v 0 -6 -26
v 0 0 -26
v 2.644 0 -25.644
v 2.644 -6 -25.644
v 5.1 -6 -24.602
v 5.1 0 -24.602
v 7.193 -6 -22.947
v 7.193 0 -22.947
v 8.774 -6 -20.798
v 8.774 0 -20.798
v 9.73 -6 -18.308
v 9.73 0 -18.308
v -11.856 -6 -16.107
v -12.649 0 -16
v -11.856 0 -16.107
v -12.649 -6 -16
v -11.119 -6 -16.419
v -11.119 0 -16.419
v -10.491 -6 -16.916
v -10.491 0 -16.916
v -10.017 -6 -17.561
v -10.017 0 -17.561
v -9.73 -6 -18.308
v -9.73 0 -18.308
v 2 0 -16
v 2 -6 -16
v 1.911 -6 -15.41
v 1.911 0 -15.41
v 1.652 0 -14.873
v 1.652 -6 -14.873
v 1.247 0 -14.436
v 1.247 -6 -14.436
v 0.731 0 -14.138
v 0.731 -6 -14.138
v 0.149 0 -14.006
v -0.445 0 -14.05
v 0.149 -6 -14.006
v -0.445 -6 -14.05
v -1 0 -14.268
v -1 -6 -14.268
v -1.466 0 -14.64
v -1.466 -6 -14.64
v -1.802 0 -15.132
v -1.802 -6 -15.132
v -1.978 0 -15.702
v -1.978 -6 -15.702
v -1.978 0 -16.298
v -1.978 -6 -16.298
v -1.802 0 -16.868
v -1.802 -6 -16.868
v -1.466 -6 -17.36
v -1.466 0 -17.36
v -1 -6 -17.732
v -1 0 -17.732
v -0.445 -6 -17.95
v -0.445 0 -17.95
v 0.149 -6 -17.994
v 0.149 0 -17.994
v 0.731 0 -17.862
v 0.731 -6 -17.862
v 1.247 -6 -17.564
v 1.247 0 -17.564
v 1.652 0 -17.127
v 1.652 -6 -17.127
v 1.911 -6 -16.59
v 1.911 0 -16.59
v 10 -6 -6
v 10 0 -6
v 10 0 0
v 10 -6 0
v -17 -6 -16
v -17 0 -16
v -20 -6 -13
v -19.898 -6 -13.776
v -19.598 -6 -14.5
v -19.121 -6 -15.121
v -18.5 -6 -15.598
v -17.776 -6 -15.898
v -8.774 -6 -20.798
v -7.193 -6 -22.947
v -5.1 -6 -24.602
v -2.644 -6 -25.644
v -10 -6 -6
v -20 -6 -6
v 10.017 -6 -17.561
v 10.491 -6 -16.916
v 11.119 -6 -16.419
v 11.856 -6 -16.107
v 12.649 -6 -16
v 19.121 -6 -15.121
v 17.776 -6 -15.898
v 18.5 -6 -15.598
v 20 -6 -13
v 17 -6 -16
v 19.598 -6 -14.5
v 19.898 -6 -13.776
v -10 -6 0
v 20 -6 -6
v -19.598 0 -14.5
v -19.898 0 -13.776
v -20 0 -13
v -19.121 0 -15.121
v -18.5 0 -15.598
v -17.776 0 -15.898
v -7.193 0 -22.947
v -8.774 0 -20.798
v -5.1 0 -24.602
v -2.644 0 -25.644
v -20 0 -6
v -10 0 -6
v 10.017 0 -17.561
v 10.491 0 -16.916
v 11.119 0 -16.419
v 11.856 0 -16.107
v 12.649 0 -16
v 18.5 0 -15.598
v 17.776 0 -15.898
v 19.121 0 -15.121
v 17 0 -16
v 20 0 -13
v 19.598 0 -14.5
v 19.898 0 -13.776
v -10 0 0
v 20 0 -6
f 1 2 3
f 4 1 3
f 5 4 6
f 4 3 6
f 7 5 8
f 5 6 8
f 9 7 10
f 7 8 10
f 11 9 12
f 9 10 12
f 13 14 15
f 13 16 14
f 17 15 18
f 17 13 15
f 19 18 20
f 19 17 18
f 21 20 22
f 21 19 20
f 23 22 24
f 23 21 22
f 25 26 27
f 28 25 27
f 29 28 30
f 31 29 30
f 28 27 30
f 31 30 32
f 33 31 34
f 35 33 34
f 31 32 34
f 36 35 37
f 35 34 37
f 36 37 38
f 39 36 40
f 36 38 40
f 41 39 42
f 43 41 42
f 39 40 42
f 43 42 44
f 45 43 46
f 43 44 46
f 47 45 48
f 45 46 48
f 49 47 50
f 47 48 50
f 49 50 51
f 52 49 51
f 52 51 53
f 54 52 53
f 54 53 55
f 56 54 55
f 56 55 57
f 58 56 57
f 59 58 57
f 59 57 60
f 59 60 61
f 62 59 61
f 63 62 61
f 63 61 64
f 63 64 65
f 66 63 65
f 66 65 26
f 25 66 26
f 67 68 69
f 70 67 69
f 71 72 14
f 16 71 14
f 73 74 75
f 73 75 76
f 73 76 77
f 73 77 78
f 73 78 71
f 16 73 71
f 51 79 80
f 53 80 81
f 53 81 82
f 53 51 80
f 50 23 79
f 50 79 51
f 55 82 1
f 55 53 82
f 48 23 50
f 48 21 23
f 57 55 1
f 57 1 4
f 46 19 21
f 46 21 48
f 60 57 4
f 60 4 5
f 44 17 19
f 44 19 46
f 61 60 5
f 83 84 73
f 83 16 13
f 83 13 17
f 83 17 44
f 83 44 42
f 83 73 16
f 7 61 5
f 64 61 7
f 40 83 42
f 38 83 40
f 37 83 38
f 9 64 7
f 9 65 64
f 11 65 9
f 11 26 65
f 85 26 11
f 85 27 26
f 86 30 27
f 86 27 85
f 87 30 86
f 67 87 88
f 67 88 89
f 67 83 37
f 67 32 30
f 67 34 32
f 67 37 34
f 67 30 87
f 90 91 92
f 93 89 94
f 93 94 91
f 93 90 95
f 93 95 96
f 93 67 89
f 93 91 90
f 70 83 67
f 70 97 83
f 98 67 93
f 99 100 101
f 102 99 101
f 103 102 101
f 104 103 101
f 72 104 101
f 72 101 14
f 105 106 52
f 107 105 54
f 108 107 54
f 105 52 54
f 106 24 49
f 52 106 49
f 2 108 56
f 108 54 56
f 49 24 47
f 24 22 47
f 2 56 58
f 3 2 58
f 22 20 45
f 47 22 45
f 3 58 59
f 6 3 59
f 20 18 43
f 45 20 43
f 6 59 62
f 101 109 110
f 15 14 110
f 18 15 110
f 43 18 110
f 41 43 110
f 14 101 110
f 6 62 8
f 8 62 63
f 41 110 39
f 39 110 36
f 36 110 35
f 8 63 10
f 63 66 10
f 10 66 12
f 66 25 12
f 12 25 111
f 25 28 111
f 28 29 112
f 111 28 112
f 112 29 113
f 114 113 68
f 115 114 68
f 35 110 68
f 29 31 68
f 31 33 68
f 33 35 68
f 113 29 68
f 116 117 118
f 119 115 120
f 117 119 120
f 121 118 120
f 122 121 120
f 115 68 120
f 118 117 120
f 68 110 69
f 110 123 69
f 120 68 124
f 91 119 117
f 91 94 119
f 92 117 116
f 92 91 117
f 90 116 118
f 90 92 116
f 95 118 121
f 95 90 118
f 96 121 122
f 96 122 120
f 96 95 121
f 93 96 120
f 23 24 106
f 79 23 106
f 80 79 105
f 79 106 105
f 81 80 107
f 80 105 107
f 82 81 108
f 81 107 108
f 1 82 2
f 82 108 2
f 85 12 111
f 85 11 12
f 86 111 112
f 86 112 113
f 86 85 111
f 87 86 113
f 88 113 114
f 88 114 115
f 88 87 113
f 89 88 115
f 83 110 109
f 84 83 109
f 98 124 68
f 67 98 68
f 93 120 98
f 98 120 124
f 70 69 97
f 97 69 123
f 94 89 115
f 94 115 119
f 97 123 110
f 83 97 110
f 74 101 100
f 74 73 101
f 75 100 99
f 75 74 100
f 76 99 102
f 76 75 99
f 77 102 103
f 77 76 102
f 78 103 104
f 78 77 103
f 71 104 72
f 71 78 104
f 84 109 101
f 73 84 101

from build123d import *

# Parameters (mm, degrees)
F1_DEPTH = 6
F3_R     = 3
F2_R     = 2
F4_DEPTH = 6.001


with BuildPart() as f1:
    # F0 (on Front) → F1 (new body)
    with BuildSketch(Plane.XZ):
        with BuildLine():
            Line((10, 0), (0, 0))
            Line((0, 0), (-10, 0))
            Line((-10, 0), (-10, -6))
            Line((-10, -6), (-20, -6))
            Line((-20, -6), (-20, -16))
            Line((-20, -16), (-10, -16))
            ThreePointArc((-10, -16), (-7.071068, -23.071068), (0, -26))
            ThreePointArc((0, -26), (7.071068, -23.071068), (10, -16))
            Line((10, -16), (20, -16))
            Line((20, -16), (20, -6))
            Line((20, -6), (10, -6))
            Line((10, -6), (10, 0))
        make_face()
    extrude(amount=F1_DEPTH)

    # F3
    f3_edges = [f1.edges().sort_by_distance(p)[0] for p in [
        (10, -3, -16),
        (-10, -3, -16),
        (20, -3, -16),
        (-20, -3, -16),
    ]]
    fillet(f3_edges, radius=F3_R)

    # F2 (on face) → F4 (cut, through all)
    with BuildSketch(Plane.XZ.offset(6)):
        with Locations((0, -16)):
            Circle(F2_R)
    extrude(amount=-F4_DEPTH, mode=Mode.SUBTRACT)


solid = f1.part
